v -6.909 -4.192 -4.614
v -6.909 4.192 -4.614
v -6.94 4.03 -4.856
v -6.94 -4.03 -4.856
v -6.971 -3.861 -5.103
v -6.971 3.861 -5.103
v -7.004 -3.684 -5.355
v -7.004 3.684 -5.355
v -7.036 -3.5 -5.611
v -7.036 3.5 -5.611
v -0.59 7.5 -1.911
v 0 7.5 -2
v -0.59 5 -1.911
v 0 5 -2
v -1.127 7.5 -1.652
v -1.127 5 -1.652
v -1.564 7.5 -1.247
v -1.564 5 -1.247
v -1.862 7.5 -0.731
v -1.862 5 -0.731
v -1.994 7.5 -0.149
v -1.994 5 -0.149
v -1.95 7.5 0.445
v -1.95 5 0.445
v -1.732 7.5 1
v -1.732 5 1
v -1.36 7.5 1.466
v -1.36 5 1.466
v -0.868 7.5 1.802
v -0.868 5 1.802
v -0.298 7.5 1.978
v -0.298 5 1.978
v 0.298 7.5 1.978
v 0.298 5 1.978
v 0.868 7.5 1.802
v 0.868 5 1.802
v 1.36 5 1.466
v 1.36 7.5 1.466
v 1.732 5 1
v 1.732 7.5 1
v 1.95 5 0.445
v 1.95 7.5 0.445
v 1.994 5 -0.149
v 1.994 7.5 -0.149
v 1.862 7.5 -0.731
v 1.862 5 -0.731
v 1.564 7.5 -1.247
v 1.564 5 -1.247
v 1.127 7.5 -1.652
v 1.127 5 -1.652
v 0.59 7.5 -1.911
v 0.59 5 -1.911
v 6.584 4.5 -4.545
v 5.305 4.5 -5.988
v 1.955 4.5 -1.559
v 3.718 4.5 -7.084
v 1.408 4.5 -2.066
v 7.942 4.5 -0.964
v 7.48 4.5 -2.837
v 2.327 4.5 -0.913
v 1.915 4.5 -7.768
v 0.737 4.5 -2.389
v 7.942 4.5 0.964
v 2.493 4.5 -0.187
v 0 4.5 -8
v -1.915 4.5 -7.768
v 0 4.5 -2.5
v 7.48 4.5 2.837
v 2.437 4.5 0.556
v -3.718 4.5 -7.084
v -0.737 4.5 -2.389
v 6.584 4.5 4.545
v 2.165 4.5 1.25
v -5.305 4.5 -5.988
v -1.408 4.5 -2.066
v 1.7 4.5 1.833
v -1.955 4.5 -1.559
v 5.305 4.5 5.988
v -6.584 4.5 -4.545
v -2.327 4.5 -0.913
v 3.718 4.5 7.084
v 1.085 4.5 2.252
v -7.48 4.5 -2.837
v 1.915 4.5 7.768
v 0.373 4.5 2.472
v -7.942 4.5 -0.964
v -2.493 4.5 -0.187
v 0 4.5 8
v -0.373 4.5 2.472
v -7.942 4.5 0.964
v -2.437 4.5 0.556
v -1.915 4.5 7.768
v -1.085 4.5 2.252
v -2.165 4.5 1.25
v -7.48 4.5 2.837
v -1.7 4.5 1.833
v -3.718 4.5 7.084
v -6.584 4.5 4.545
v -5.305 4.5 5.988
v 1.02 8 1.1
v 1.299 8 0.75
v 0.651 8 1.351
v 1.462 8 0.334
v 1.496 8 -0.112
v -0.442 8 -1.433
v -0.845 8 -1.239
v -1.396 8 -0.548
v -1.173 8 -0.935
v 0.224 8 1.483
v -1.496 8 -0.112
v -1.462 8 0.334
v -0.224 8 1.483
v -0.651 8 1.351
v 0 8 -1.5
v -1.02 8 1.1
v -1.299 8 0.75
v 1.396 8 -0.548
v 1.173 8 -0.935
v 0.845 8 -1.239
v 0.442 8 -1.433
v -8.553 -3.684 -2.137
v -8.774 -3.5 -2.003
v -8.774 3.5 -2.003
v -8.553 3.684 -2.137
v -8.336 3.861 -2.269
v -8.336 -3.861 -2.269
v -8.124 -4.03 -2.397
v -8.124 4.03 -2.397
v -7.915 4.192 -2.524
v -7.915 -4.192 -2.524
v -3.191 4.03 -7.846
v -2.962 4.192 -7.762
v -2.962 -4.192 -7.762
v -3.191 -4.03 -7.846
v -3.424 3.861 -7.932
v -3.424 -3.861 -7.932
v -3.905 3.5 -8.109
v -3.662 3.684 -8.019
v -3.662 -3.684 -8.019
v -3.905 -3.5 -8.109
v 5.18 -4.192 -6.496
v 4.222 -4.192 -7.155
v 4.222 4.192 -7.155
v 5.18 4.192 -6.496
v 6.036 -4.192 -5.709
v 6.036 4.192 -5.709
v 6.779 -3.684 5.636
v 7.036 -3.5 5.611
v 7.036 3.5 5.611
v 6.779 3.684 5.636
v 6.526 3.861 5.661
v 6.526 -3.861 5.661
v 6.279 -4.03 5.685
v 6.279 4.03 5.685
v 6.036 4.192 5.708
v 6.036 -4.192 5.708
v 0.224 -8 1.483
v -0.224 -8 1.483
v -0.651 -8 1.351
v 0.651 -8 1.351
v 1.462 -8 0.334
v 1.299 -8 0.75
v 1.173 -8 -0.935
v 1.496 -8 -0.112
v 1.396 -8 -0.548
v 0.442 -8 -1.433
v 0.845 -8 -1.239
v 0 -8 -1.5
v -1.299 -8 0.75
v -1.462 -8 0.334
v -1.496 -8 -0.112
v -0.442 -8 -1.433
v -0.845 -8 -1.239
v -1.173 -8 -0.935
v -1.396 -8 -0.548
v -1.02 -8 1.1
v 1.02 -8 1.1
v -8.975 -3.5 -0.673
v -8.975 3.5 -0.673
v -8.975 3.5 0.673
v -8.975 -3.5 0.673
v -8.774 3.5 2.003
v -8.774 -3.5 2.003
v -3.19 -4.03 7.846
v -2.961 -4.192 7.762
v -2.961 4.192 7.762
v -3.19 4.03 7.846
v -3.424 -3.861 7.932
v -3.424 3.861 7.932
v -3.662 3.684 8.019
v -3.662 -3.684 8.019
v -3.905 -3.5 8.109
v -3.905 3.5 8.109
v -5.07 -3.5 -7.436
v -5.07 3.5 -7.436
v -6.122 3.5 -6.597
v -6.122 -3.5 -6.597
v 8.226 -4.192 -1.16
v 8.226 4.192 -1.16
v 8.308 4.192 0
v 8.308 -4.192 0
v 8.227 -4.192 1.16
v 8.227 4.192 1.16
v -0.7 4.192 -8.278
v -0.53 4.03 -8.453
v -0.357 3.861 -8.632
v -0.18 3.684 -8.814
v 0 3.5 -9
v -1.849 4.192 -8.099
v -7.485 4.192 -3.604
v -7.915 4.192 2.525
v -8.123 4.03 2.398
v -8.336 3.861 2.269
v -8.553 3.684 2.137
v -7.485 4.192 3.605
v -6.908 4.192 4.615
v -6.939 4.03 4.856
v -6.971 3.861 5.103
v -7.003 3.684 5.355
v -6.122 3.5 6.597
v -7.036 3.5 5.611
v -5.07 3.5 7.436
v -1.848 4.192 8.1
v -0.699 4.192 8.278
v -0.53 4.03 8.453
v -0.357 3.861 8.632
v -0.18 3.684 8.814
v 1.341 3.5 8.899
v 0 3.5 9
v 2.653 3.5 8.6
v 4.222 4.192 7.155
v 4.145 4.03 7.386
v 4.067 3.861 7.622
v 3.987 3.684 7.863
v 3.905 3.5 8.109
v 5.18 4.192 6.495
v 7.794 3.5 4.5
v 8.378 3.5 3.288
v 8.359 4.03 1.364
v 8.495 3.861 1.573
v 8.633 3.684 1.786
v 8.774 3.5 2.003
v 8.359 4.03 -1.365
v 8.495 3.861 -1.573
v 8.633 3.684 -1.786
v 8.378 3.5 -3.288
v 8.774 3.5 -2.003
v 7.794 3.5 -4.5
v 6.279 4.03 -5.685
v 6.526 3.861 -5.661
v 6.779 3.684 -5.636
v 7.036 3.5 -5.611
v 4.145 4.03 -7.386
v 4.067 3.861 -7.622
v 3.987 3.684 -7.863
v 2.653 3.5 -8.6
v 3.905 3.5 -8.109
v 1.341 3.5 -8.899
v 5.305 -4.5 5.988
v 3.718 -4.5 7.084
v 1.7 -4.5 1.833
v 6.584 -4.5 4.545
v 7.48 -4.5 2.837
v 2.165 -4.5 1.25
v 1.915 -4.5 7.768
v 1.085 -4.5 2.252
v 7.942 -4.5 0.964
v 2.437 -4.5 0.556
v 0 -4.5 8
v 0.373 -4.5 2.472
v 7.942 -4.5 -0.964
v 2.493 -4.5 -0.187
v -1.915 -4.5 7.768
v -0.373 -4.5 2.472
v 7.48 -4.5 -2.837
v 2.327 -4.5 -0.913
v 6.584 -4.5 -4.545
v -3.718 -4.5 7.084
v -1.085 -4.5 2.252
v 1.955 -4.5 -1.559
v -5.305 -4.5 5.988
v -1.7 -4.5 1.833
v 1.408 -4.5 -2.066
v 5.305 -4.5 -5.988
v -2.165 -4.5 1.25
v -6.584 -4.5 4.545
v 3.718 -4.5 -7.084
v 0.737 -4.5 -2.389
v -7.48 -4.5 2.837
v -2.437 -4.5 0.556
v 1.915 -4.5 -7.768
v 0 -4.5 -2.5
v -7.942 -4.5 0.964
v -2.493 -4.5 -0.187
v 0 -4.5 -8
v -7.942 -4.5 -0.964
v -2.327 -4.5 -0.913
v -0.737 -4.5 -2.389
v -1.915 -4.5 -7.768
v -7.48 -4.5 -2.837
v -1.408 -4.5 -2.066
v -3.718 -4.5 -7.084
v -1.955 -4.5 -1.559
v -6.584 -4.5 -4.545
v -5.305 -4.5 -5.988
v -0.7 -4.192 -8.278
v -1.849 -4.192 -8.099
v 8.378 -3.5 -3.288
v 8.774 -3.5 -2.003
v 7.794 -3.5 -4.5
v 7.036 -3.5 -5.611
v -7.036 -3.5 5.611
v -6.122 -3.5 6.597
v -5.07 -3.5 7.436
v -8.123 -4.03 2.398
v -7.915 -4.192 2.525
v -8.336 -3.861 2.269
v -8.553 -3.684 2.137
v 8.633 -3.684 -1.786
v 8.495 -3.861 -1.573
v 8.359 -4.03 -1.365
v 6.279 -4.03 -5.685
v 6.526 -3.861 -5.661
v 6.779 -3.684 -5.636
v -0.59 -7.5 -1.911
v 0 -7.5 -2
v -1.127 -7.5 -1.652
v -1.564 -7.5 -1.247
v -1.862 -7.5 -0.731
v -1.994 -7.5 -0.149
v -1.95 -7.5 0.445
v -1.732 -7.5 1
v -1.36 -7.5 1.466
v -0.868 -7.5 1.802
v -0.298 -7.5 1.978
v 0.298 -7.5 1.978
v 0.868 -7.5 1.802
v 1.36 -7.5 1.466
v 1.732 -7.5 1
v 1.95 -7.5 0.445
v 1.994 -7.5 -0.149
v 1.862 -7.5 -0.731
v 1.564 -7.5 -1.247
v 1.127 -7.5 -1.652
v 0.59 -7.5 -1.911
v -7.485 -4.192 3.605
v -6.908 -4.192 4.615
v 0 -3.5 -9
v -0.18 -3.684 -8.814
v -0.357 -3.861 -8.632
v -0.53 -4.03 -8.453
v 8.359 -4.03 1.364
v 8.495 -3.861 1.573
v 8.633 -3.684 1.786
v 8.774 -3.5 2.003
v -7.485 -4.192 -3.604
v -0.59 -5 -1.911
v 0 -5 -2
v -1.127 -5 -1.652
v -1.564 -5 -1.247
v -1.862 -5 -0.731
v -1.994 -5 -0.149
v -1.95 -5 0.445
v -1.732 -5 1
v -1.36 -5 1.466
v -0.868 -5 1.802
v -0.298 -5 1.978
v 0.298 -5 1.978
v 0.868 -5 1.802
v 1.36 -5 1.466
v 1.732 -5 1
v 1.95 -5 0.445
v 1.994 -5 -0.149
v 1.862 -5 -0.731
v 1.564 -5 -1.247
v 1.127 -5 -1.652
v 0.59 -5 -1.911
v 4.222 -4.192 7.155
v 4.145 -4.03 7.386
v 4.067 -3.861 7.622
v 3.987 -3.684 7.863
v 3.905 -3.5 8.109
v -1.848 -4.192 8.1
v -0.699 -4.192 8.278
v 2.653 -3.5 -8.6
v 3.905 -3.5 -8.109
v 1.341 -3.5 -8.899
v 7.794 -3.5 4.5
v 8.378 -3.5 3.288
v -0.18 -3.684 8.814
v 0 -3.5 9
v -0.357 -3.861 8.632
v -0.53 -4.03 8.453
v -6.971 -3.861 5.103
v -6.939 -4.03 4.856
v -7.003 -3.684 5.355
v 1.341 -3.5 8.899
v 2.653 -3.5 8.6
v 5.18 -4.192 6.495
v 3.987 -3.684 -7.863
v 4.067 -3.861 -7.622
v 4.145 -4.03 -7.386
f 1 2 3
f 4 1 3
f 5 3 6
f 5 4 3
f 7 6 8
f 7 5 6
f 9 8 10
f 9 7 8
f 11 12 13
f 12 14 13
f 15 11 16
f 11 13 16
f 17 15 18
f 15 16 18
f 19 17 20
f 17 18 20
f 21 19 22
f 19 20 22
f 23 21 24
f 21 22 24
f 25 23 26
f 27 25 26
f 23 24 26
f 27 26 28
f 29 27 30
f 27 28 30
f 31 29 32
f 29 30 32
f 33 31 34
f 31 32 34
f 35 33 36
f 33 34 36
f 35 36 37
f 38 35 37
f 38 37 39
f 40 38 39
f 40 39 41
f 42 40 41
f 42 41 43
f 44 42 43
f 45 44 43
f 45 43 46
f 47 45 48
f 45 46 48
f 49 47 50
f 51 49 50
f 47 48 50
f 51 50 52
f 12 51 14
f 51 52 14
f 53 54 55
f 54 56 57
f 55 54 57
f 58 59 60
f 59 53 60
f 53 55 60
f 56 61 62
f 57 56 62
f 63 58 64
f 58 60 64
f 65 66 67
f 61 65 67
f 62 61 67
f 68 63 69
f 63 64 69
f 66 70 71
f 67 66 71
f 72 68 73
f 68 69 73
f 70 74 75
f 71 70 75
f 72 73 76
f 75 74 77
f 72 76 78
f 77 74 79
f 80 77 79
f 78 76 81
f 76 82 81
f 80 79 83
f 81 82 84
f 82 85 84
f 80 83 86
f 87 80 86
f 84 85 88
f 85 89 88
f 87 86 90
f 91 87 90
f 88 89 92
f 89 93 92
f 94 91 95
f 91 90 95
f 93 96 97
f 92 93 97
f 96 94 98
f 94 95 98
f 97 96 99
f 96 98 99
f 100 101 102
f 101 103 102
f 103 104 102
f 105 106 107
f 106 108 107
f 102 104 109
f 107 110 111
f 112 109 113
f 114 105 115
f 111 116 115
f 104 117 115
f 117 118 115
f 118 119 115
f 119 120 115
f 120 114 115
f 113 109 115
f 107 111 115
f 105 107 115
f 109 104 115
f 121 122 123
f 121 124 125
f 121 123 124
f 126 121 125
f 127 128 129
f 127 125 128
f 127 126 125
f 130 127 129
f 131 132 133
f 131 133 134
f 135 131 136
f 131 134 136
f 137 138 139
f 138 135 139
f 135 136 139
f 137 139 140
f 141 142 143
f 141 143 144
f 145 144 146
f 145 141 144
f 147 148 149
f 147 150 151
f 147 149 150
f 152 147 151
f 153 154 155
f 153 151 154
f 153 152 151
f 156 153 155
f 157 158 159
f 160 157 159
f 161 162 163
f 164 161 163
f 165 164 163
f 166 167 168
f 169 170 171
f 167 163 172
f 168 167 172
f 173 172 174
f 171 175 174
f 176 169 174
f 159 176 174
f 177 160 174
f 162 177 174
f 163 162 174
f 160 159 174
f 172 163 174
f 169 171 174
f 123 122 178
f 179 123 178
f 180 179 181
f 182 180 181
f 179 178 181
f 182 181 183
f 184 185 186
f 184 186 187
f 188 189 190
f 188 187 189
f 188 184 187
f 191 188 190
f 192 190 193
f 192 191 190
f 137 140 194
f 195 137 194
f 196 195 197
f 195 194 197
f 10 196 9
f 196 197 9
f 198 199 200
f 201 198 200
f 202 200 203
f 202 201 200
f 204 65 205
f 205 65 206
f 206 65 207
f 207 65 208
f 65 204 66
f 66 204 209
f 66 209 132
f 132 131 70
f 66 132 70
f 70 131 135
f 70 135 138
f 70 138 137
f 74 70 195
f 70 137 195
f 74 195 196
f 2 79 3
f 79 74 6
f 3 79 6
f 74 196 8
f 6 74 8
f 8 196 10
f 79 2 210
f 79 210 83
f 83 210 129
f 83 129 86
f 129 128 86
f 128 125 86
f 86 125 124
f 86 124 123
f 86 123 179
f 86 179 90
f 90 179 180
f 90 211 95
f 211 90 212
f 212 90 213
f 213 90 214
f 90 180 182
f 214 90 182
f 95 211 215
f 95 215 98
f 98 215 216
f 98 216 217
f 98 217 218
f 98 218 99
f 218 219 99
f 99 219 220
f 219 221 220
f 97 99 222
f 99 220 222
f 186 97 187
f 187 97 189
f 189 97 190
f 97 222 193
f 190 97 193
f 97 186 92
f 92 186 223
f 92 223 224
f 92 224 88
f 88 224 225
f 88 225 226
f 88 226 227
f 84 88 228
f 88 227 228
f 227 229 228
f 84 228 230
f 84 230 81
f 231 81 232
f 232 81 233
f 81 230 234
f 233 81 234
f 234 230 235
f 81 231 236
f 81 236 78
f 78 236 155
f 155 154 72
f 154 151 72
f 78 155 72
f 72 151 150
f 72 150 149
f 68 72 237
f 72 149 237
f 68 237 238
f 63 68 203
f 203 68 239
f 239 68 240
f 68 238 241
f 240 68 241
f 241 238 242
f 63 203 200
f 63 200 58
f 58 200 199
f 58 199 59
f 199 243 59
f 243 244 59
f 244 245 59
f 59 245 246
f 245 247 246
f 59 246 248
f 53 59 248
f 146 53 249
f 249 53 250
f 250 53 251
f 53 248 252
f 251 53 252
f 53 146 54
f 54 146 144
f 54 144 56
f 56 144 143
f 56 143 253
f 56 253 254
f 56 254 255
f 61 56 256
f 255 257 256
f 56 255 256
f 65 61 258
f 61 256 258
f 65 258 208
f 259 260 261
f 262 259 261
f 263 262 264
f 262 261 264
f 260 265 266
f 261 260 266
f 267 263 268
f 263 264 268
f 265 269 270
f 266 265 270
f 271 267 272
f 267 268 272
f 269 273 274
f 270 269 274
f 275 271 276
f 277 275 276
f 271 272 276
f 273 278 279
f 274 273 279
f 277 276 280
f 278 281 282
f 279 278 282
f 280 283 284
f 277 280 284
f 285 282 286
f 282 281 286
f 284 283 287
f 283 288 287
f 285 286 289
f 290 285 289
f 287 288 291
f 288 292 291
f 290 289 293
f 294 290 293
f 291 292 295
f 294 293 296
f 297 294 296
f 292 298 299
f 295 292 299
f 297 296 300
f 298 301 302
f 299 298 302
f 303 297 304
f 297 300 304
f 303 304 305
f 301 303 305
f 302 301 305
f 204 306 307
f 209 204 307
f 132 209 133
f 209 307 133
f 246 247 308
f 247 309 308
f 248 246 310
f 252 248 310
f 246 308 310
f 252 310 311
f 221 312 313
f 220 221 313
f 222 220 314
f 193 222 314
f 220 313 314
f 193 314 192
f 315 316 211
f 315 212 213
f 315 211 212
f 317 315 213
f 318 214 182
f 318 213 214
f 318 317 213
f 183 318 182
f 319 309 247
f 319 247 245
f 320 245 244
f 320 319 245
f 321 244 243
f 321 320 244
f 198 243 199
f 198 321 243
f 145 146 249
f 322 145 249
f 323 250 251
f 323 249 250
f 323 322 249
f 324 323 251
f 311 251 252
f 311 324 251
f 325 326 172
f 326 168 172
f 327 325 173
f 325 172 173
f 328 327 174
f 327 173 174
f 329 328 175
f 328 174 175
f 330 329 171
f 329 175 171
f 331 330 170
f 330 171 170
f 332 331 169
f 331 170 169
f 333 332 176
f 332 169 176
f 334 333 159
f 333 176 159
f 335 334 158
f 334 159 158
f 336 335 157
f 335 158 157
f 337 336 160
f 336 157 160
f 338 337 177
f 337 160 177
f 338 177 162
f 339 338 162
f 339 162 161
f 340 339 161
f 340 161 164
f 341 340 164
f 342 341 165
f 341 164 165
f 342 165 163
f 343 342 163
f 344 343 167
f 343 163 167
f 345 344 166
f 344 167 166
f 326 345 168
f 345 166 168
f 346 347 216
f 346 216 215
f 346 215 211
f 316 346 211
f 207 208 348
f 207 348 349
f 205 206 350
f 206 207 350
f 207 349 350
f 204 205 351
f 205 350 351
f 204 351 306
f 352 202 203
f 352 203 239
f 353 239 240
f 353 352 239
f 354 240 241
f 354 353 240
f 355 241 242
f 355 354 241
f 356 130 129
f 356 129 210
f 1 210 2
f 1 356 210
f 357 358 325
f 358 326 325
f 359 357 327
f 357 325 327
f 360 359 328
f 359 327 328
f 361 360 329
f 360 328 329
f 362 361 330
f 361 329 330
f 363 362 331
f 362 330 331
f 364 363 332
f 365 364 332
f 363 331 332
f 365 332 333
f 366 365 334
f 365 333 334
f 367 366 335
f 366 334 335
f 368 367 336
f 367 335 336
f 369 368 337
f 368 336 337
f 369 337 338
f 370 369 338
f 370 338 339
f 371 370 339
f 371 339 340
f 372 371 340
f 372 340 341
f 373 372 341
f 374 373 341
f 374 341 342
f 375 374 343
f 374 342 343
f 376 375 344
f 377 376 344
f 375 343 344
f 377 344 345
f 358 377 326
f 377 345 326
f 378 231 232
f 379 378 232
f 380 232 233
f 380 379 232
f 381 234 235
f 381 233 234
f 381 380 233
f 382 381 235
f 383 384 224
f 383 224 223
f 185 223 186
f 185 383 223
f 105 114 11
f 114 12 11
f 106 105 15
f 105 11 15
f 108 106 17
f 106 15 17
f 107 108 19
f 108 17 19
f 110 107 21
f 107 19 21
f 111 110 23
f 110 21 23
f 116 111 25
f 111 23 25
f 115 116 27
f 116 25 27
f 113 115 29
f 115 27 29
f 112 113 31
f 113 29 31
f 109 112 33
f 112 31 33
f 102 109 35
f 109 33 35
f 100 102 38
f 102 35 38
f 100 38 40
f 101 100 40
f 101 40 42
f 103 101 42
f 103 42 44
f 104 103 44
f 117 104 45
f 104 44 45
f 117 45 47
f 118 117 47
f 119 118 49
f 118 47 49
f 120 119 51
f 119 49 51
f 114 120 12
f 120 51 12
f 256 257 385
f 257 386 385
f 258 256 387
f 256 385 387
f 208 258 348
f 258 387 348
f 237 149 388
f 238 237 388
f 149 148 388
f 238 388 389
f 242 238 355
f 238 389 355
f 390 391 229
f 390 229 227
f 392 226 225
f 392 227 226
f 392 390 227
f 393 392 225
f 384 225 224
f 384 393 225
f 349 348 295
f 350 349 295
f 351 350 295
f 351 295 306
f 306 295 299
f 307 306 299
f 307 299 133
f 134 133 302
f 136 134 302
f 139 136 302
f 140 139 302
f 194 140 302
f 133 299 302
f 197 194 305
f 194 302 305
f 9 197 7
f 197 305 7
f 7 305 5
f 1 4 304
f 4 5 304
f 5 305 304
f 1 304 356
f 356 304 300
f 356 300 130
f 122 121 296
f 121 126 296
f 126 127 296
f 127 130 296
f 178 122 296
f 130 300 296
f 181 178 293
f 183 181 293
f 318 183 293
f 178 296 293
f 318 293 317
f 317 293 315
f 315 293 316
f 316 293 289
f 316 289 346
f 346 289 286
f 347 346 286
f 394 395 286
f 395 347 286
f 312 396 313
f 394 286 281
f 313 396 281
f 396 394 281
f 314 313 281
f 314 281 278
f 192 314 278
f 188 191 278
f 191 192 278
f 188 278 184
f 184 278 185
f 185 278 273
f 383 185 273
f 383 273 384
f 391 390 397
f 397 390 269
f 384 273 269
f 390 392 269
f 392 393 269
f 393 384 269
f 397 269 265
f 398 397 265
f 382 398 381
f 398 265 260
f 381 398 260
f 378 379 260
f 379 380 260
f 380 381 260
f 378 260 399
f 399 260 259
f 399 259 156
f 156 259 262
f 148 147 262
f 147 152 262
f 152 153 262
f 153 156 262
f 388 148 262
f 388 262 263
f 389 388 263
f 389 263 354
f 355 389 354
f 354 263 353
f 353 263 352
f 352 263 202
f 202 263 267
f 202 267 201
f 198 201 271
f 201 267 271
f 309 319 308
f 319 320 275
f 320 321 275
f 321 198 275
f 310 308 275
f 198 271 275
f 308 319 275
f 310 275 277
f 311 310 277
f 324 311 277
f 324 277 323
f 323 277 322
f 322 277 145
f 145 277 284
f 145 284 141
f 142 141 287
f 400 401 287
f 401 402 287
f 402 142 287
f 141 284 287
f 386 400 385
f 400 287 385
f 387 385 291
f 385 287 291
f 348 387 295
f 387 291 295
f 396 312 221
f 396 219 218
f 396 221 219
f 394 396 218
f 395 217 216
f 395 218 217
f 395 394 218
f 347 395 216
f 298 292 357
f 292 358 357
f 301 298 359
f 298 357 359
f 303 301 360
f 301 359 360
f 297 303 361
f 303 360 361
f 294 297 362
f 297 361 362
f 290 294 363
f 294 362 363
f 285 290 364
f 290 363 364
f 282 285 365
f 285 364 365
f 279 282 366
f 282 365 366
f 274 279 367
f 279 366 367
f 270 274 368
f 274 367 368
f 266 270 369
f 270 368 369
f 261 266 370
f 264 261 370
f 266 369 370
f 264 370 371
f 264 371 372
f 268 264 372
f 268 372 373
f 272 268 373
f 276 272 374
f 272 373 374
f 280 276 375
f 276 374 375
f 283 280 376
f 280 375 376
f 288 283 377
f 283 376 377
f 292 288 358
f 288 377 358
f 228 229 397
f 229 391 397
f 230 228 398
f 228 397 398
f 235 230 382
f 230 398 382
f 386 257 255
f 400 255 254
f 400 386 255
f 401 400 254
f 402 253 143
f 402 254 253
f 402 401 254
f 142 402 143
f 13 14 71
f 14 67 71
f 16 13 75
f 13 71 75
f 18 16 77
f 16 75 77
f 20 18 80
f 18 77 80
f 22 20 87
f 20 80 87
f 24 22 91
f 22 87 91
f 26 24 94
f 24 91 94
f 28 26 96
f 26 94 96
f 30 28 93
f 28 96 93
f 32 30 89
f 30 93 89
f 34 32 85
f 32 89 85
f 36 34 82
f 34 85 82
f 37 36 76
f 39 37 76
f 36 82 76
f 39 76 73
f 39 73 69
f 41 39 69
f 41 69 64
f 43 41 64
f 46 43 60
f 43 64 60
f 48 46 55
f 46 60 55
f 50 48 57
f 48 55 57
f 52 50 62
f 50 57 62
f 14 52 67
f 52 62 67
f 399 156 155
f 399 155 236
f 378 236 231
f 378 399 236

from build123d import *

# Parameters (mm, degrees)
CORTAR_EXTRUIR1_DEPTH      = 18.839562775
CORTAR_EXTRUIR1_DEPTH_BACK = 18.839562775


with BuildPart() as part:
    # Croquis1 → Revolución1 (revolve)
    with BuildSketch(Plane.XY, mode=Mode.PRIVATE) as revoluci_n1_sk:
        Polygon((0, -8), (0, 8), (-1.5, 8), (-2, 7.5), (-2, 5), (-2.5, 4.5), (-8, 4.5), (-9, 3.5), (-9, -3.5), (-8, -4.5), (-2.5, -4.5), (-2, -5), (-2, -7.5), (-1.5, -8), align=None)
    revolve(revoluci_n1_sk.sketch.rotate(Axis((0, -8, 0), (0, 1, 0)), 270), axis=Axis((0, -8, 0), (0, 1, 0)))

    # Croquis2 → Cortar-Extruir1 (cut, two sides: drawn at the far end of the back side and taken through both)
    with BuildSketch(Plane(origin=(0, 4.5, 0), x_dir=(1, 0, 0), z_dir=(0, 1, 0)).offset(-CORTAR_EXTRUIR1_DEPTH_BACK)):
        with BuildLine():
            Line((0, 9), (-0.7, 8.278295995))
            ThreePointArc((-0.7, 8.278295995), (-1.848968457, 8.099475306), (-2.961715623, 7.761985903))
            Line((-2.961715623, 7.761985903), (-3.904953652, 8.108719811))
            ThreePointArc((-3.904953652, 8.108719811), (-2.002688406, 8.77435121), (0, 9))
        make_face()
        with BuildLine():
            Line((3.904953652, 8.108719811), (4.221965458, 7.155081569))
            ThreePointArc((4.221965458, 7.155081569), (5.179611809, 6.495522003), (6.035789569, 5.708715168))
            Line((6.035789569, 5.708715168), (7.036483342, 5.611408217))
            ThreePointArc((7.036483342, 5.611408217), (5.611408217, 7.036483342), (3.904953652, 8.108719811))
        make_face()
        with BuildLine():
            Line((8.77435121, 2.002688406), (8.226420437, 1.160254876))
            ThreePointArc((8.226420437, 1.160254876), (8.307838738, 0.000308148), (8.226506485, -1.159644618))
            Line((8.226506485, -1.159644618), (8.77435121, -2.002688406))
            ThreePointArc((8.77435121, -2.002688406), (9, 0), (8.77435121, 2.002688406))
        make_face()
        with BuildLine():
            Line((7.036483342, -5.611408217), (6.036213038, -5.708267403))
            ThreePointArc((6.036213038, -5.708267403), (5.180093648, -6.495137749), (4.222496227, -7.154768354))
            Line((4.222496227, -7.154768354), (3.904953652, -8.108719811))
            ThreePointArc((3.904953652, -8.108719811), (5.611408217, -7.036483342), (7.036483342, -5.611408217))
        make_face()
        with BuildLine():
            Line((0, -9), (-0.699385895, -8.2783479))
            ThreePointArc((-0.699385895, -8.2783479), (-1.848367613, -8.099612444), (-2.961139812, -7.762205588))
            Line((-2.961139812, -7.762205588), (-3.904953652, -8.108719811))
            ThreePointArc((-3.904953652, -8.108719811), (-2.002688406, -8.77435121), (0, -9))
        make_face()
        with BuildLine():
            Line((-7.036483342, -5.611408217), (-6.908332984, -4.614663581))
            ThreePointArc((-6.908332984, -4.614663581), (-7.484970362, -3.604913767), (-7.914977177, -2.524543695))
            Line((-7.914977177, -2.524543695), (-8.77435121, -2.002688406))
            ThreePointArc((-8.77435121, -2.002688406), (-8.108719811, -3.904953652), (-7.036483342, -5.611408217))
        make_face()
        with BuildLine():
            Line((-8.77435121, 2.002688406), (-7.915164432, 2.523956536))
            ThreePointArc((-7.915164432, 2.523956536), (-7.485237762, 3.604358504), (-6.908675292, 4.614151092))
            Line((-6.908675292, 4.614151092), (-7.036483342, 5.611408217))
            ThreePointArc((-7.036483342, 5.611408217), (-8.108719811, 3.904953652), (-8.77435121, 2.002688406))
        make_face()
    extrude(amount=CORTAR_EXTRUIR1_DEPTH + CORTAR_EXTRUIR1_DEPTH_BACK, mode=Mode.SUBTRACT)


solid = part.part
